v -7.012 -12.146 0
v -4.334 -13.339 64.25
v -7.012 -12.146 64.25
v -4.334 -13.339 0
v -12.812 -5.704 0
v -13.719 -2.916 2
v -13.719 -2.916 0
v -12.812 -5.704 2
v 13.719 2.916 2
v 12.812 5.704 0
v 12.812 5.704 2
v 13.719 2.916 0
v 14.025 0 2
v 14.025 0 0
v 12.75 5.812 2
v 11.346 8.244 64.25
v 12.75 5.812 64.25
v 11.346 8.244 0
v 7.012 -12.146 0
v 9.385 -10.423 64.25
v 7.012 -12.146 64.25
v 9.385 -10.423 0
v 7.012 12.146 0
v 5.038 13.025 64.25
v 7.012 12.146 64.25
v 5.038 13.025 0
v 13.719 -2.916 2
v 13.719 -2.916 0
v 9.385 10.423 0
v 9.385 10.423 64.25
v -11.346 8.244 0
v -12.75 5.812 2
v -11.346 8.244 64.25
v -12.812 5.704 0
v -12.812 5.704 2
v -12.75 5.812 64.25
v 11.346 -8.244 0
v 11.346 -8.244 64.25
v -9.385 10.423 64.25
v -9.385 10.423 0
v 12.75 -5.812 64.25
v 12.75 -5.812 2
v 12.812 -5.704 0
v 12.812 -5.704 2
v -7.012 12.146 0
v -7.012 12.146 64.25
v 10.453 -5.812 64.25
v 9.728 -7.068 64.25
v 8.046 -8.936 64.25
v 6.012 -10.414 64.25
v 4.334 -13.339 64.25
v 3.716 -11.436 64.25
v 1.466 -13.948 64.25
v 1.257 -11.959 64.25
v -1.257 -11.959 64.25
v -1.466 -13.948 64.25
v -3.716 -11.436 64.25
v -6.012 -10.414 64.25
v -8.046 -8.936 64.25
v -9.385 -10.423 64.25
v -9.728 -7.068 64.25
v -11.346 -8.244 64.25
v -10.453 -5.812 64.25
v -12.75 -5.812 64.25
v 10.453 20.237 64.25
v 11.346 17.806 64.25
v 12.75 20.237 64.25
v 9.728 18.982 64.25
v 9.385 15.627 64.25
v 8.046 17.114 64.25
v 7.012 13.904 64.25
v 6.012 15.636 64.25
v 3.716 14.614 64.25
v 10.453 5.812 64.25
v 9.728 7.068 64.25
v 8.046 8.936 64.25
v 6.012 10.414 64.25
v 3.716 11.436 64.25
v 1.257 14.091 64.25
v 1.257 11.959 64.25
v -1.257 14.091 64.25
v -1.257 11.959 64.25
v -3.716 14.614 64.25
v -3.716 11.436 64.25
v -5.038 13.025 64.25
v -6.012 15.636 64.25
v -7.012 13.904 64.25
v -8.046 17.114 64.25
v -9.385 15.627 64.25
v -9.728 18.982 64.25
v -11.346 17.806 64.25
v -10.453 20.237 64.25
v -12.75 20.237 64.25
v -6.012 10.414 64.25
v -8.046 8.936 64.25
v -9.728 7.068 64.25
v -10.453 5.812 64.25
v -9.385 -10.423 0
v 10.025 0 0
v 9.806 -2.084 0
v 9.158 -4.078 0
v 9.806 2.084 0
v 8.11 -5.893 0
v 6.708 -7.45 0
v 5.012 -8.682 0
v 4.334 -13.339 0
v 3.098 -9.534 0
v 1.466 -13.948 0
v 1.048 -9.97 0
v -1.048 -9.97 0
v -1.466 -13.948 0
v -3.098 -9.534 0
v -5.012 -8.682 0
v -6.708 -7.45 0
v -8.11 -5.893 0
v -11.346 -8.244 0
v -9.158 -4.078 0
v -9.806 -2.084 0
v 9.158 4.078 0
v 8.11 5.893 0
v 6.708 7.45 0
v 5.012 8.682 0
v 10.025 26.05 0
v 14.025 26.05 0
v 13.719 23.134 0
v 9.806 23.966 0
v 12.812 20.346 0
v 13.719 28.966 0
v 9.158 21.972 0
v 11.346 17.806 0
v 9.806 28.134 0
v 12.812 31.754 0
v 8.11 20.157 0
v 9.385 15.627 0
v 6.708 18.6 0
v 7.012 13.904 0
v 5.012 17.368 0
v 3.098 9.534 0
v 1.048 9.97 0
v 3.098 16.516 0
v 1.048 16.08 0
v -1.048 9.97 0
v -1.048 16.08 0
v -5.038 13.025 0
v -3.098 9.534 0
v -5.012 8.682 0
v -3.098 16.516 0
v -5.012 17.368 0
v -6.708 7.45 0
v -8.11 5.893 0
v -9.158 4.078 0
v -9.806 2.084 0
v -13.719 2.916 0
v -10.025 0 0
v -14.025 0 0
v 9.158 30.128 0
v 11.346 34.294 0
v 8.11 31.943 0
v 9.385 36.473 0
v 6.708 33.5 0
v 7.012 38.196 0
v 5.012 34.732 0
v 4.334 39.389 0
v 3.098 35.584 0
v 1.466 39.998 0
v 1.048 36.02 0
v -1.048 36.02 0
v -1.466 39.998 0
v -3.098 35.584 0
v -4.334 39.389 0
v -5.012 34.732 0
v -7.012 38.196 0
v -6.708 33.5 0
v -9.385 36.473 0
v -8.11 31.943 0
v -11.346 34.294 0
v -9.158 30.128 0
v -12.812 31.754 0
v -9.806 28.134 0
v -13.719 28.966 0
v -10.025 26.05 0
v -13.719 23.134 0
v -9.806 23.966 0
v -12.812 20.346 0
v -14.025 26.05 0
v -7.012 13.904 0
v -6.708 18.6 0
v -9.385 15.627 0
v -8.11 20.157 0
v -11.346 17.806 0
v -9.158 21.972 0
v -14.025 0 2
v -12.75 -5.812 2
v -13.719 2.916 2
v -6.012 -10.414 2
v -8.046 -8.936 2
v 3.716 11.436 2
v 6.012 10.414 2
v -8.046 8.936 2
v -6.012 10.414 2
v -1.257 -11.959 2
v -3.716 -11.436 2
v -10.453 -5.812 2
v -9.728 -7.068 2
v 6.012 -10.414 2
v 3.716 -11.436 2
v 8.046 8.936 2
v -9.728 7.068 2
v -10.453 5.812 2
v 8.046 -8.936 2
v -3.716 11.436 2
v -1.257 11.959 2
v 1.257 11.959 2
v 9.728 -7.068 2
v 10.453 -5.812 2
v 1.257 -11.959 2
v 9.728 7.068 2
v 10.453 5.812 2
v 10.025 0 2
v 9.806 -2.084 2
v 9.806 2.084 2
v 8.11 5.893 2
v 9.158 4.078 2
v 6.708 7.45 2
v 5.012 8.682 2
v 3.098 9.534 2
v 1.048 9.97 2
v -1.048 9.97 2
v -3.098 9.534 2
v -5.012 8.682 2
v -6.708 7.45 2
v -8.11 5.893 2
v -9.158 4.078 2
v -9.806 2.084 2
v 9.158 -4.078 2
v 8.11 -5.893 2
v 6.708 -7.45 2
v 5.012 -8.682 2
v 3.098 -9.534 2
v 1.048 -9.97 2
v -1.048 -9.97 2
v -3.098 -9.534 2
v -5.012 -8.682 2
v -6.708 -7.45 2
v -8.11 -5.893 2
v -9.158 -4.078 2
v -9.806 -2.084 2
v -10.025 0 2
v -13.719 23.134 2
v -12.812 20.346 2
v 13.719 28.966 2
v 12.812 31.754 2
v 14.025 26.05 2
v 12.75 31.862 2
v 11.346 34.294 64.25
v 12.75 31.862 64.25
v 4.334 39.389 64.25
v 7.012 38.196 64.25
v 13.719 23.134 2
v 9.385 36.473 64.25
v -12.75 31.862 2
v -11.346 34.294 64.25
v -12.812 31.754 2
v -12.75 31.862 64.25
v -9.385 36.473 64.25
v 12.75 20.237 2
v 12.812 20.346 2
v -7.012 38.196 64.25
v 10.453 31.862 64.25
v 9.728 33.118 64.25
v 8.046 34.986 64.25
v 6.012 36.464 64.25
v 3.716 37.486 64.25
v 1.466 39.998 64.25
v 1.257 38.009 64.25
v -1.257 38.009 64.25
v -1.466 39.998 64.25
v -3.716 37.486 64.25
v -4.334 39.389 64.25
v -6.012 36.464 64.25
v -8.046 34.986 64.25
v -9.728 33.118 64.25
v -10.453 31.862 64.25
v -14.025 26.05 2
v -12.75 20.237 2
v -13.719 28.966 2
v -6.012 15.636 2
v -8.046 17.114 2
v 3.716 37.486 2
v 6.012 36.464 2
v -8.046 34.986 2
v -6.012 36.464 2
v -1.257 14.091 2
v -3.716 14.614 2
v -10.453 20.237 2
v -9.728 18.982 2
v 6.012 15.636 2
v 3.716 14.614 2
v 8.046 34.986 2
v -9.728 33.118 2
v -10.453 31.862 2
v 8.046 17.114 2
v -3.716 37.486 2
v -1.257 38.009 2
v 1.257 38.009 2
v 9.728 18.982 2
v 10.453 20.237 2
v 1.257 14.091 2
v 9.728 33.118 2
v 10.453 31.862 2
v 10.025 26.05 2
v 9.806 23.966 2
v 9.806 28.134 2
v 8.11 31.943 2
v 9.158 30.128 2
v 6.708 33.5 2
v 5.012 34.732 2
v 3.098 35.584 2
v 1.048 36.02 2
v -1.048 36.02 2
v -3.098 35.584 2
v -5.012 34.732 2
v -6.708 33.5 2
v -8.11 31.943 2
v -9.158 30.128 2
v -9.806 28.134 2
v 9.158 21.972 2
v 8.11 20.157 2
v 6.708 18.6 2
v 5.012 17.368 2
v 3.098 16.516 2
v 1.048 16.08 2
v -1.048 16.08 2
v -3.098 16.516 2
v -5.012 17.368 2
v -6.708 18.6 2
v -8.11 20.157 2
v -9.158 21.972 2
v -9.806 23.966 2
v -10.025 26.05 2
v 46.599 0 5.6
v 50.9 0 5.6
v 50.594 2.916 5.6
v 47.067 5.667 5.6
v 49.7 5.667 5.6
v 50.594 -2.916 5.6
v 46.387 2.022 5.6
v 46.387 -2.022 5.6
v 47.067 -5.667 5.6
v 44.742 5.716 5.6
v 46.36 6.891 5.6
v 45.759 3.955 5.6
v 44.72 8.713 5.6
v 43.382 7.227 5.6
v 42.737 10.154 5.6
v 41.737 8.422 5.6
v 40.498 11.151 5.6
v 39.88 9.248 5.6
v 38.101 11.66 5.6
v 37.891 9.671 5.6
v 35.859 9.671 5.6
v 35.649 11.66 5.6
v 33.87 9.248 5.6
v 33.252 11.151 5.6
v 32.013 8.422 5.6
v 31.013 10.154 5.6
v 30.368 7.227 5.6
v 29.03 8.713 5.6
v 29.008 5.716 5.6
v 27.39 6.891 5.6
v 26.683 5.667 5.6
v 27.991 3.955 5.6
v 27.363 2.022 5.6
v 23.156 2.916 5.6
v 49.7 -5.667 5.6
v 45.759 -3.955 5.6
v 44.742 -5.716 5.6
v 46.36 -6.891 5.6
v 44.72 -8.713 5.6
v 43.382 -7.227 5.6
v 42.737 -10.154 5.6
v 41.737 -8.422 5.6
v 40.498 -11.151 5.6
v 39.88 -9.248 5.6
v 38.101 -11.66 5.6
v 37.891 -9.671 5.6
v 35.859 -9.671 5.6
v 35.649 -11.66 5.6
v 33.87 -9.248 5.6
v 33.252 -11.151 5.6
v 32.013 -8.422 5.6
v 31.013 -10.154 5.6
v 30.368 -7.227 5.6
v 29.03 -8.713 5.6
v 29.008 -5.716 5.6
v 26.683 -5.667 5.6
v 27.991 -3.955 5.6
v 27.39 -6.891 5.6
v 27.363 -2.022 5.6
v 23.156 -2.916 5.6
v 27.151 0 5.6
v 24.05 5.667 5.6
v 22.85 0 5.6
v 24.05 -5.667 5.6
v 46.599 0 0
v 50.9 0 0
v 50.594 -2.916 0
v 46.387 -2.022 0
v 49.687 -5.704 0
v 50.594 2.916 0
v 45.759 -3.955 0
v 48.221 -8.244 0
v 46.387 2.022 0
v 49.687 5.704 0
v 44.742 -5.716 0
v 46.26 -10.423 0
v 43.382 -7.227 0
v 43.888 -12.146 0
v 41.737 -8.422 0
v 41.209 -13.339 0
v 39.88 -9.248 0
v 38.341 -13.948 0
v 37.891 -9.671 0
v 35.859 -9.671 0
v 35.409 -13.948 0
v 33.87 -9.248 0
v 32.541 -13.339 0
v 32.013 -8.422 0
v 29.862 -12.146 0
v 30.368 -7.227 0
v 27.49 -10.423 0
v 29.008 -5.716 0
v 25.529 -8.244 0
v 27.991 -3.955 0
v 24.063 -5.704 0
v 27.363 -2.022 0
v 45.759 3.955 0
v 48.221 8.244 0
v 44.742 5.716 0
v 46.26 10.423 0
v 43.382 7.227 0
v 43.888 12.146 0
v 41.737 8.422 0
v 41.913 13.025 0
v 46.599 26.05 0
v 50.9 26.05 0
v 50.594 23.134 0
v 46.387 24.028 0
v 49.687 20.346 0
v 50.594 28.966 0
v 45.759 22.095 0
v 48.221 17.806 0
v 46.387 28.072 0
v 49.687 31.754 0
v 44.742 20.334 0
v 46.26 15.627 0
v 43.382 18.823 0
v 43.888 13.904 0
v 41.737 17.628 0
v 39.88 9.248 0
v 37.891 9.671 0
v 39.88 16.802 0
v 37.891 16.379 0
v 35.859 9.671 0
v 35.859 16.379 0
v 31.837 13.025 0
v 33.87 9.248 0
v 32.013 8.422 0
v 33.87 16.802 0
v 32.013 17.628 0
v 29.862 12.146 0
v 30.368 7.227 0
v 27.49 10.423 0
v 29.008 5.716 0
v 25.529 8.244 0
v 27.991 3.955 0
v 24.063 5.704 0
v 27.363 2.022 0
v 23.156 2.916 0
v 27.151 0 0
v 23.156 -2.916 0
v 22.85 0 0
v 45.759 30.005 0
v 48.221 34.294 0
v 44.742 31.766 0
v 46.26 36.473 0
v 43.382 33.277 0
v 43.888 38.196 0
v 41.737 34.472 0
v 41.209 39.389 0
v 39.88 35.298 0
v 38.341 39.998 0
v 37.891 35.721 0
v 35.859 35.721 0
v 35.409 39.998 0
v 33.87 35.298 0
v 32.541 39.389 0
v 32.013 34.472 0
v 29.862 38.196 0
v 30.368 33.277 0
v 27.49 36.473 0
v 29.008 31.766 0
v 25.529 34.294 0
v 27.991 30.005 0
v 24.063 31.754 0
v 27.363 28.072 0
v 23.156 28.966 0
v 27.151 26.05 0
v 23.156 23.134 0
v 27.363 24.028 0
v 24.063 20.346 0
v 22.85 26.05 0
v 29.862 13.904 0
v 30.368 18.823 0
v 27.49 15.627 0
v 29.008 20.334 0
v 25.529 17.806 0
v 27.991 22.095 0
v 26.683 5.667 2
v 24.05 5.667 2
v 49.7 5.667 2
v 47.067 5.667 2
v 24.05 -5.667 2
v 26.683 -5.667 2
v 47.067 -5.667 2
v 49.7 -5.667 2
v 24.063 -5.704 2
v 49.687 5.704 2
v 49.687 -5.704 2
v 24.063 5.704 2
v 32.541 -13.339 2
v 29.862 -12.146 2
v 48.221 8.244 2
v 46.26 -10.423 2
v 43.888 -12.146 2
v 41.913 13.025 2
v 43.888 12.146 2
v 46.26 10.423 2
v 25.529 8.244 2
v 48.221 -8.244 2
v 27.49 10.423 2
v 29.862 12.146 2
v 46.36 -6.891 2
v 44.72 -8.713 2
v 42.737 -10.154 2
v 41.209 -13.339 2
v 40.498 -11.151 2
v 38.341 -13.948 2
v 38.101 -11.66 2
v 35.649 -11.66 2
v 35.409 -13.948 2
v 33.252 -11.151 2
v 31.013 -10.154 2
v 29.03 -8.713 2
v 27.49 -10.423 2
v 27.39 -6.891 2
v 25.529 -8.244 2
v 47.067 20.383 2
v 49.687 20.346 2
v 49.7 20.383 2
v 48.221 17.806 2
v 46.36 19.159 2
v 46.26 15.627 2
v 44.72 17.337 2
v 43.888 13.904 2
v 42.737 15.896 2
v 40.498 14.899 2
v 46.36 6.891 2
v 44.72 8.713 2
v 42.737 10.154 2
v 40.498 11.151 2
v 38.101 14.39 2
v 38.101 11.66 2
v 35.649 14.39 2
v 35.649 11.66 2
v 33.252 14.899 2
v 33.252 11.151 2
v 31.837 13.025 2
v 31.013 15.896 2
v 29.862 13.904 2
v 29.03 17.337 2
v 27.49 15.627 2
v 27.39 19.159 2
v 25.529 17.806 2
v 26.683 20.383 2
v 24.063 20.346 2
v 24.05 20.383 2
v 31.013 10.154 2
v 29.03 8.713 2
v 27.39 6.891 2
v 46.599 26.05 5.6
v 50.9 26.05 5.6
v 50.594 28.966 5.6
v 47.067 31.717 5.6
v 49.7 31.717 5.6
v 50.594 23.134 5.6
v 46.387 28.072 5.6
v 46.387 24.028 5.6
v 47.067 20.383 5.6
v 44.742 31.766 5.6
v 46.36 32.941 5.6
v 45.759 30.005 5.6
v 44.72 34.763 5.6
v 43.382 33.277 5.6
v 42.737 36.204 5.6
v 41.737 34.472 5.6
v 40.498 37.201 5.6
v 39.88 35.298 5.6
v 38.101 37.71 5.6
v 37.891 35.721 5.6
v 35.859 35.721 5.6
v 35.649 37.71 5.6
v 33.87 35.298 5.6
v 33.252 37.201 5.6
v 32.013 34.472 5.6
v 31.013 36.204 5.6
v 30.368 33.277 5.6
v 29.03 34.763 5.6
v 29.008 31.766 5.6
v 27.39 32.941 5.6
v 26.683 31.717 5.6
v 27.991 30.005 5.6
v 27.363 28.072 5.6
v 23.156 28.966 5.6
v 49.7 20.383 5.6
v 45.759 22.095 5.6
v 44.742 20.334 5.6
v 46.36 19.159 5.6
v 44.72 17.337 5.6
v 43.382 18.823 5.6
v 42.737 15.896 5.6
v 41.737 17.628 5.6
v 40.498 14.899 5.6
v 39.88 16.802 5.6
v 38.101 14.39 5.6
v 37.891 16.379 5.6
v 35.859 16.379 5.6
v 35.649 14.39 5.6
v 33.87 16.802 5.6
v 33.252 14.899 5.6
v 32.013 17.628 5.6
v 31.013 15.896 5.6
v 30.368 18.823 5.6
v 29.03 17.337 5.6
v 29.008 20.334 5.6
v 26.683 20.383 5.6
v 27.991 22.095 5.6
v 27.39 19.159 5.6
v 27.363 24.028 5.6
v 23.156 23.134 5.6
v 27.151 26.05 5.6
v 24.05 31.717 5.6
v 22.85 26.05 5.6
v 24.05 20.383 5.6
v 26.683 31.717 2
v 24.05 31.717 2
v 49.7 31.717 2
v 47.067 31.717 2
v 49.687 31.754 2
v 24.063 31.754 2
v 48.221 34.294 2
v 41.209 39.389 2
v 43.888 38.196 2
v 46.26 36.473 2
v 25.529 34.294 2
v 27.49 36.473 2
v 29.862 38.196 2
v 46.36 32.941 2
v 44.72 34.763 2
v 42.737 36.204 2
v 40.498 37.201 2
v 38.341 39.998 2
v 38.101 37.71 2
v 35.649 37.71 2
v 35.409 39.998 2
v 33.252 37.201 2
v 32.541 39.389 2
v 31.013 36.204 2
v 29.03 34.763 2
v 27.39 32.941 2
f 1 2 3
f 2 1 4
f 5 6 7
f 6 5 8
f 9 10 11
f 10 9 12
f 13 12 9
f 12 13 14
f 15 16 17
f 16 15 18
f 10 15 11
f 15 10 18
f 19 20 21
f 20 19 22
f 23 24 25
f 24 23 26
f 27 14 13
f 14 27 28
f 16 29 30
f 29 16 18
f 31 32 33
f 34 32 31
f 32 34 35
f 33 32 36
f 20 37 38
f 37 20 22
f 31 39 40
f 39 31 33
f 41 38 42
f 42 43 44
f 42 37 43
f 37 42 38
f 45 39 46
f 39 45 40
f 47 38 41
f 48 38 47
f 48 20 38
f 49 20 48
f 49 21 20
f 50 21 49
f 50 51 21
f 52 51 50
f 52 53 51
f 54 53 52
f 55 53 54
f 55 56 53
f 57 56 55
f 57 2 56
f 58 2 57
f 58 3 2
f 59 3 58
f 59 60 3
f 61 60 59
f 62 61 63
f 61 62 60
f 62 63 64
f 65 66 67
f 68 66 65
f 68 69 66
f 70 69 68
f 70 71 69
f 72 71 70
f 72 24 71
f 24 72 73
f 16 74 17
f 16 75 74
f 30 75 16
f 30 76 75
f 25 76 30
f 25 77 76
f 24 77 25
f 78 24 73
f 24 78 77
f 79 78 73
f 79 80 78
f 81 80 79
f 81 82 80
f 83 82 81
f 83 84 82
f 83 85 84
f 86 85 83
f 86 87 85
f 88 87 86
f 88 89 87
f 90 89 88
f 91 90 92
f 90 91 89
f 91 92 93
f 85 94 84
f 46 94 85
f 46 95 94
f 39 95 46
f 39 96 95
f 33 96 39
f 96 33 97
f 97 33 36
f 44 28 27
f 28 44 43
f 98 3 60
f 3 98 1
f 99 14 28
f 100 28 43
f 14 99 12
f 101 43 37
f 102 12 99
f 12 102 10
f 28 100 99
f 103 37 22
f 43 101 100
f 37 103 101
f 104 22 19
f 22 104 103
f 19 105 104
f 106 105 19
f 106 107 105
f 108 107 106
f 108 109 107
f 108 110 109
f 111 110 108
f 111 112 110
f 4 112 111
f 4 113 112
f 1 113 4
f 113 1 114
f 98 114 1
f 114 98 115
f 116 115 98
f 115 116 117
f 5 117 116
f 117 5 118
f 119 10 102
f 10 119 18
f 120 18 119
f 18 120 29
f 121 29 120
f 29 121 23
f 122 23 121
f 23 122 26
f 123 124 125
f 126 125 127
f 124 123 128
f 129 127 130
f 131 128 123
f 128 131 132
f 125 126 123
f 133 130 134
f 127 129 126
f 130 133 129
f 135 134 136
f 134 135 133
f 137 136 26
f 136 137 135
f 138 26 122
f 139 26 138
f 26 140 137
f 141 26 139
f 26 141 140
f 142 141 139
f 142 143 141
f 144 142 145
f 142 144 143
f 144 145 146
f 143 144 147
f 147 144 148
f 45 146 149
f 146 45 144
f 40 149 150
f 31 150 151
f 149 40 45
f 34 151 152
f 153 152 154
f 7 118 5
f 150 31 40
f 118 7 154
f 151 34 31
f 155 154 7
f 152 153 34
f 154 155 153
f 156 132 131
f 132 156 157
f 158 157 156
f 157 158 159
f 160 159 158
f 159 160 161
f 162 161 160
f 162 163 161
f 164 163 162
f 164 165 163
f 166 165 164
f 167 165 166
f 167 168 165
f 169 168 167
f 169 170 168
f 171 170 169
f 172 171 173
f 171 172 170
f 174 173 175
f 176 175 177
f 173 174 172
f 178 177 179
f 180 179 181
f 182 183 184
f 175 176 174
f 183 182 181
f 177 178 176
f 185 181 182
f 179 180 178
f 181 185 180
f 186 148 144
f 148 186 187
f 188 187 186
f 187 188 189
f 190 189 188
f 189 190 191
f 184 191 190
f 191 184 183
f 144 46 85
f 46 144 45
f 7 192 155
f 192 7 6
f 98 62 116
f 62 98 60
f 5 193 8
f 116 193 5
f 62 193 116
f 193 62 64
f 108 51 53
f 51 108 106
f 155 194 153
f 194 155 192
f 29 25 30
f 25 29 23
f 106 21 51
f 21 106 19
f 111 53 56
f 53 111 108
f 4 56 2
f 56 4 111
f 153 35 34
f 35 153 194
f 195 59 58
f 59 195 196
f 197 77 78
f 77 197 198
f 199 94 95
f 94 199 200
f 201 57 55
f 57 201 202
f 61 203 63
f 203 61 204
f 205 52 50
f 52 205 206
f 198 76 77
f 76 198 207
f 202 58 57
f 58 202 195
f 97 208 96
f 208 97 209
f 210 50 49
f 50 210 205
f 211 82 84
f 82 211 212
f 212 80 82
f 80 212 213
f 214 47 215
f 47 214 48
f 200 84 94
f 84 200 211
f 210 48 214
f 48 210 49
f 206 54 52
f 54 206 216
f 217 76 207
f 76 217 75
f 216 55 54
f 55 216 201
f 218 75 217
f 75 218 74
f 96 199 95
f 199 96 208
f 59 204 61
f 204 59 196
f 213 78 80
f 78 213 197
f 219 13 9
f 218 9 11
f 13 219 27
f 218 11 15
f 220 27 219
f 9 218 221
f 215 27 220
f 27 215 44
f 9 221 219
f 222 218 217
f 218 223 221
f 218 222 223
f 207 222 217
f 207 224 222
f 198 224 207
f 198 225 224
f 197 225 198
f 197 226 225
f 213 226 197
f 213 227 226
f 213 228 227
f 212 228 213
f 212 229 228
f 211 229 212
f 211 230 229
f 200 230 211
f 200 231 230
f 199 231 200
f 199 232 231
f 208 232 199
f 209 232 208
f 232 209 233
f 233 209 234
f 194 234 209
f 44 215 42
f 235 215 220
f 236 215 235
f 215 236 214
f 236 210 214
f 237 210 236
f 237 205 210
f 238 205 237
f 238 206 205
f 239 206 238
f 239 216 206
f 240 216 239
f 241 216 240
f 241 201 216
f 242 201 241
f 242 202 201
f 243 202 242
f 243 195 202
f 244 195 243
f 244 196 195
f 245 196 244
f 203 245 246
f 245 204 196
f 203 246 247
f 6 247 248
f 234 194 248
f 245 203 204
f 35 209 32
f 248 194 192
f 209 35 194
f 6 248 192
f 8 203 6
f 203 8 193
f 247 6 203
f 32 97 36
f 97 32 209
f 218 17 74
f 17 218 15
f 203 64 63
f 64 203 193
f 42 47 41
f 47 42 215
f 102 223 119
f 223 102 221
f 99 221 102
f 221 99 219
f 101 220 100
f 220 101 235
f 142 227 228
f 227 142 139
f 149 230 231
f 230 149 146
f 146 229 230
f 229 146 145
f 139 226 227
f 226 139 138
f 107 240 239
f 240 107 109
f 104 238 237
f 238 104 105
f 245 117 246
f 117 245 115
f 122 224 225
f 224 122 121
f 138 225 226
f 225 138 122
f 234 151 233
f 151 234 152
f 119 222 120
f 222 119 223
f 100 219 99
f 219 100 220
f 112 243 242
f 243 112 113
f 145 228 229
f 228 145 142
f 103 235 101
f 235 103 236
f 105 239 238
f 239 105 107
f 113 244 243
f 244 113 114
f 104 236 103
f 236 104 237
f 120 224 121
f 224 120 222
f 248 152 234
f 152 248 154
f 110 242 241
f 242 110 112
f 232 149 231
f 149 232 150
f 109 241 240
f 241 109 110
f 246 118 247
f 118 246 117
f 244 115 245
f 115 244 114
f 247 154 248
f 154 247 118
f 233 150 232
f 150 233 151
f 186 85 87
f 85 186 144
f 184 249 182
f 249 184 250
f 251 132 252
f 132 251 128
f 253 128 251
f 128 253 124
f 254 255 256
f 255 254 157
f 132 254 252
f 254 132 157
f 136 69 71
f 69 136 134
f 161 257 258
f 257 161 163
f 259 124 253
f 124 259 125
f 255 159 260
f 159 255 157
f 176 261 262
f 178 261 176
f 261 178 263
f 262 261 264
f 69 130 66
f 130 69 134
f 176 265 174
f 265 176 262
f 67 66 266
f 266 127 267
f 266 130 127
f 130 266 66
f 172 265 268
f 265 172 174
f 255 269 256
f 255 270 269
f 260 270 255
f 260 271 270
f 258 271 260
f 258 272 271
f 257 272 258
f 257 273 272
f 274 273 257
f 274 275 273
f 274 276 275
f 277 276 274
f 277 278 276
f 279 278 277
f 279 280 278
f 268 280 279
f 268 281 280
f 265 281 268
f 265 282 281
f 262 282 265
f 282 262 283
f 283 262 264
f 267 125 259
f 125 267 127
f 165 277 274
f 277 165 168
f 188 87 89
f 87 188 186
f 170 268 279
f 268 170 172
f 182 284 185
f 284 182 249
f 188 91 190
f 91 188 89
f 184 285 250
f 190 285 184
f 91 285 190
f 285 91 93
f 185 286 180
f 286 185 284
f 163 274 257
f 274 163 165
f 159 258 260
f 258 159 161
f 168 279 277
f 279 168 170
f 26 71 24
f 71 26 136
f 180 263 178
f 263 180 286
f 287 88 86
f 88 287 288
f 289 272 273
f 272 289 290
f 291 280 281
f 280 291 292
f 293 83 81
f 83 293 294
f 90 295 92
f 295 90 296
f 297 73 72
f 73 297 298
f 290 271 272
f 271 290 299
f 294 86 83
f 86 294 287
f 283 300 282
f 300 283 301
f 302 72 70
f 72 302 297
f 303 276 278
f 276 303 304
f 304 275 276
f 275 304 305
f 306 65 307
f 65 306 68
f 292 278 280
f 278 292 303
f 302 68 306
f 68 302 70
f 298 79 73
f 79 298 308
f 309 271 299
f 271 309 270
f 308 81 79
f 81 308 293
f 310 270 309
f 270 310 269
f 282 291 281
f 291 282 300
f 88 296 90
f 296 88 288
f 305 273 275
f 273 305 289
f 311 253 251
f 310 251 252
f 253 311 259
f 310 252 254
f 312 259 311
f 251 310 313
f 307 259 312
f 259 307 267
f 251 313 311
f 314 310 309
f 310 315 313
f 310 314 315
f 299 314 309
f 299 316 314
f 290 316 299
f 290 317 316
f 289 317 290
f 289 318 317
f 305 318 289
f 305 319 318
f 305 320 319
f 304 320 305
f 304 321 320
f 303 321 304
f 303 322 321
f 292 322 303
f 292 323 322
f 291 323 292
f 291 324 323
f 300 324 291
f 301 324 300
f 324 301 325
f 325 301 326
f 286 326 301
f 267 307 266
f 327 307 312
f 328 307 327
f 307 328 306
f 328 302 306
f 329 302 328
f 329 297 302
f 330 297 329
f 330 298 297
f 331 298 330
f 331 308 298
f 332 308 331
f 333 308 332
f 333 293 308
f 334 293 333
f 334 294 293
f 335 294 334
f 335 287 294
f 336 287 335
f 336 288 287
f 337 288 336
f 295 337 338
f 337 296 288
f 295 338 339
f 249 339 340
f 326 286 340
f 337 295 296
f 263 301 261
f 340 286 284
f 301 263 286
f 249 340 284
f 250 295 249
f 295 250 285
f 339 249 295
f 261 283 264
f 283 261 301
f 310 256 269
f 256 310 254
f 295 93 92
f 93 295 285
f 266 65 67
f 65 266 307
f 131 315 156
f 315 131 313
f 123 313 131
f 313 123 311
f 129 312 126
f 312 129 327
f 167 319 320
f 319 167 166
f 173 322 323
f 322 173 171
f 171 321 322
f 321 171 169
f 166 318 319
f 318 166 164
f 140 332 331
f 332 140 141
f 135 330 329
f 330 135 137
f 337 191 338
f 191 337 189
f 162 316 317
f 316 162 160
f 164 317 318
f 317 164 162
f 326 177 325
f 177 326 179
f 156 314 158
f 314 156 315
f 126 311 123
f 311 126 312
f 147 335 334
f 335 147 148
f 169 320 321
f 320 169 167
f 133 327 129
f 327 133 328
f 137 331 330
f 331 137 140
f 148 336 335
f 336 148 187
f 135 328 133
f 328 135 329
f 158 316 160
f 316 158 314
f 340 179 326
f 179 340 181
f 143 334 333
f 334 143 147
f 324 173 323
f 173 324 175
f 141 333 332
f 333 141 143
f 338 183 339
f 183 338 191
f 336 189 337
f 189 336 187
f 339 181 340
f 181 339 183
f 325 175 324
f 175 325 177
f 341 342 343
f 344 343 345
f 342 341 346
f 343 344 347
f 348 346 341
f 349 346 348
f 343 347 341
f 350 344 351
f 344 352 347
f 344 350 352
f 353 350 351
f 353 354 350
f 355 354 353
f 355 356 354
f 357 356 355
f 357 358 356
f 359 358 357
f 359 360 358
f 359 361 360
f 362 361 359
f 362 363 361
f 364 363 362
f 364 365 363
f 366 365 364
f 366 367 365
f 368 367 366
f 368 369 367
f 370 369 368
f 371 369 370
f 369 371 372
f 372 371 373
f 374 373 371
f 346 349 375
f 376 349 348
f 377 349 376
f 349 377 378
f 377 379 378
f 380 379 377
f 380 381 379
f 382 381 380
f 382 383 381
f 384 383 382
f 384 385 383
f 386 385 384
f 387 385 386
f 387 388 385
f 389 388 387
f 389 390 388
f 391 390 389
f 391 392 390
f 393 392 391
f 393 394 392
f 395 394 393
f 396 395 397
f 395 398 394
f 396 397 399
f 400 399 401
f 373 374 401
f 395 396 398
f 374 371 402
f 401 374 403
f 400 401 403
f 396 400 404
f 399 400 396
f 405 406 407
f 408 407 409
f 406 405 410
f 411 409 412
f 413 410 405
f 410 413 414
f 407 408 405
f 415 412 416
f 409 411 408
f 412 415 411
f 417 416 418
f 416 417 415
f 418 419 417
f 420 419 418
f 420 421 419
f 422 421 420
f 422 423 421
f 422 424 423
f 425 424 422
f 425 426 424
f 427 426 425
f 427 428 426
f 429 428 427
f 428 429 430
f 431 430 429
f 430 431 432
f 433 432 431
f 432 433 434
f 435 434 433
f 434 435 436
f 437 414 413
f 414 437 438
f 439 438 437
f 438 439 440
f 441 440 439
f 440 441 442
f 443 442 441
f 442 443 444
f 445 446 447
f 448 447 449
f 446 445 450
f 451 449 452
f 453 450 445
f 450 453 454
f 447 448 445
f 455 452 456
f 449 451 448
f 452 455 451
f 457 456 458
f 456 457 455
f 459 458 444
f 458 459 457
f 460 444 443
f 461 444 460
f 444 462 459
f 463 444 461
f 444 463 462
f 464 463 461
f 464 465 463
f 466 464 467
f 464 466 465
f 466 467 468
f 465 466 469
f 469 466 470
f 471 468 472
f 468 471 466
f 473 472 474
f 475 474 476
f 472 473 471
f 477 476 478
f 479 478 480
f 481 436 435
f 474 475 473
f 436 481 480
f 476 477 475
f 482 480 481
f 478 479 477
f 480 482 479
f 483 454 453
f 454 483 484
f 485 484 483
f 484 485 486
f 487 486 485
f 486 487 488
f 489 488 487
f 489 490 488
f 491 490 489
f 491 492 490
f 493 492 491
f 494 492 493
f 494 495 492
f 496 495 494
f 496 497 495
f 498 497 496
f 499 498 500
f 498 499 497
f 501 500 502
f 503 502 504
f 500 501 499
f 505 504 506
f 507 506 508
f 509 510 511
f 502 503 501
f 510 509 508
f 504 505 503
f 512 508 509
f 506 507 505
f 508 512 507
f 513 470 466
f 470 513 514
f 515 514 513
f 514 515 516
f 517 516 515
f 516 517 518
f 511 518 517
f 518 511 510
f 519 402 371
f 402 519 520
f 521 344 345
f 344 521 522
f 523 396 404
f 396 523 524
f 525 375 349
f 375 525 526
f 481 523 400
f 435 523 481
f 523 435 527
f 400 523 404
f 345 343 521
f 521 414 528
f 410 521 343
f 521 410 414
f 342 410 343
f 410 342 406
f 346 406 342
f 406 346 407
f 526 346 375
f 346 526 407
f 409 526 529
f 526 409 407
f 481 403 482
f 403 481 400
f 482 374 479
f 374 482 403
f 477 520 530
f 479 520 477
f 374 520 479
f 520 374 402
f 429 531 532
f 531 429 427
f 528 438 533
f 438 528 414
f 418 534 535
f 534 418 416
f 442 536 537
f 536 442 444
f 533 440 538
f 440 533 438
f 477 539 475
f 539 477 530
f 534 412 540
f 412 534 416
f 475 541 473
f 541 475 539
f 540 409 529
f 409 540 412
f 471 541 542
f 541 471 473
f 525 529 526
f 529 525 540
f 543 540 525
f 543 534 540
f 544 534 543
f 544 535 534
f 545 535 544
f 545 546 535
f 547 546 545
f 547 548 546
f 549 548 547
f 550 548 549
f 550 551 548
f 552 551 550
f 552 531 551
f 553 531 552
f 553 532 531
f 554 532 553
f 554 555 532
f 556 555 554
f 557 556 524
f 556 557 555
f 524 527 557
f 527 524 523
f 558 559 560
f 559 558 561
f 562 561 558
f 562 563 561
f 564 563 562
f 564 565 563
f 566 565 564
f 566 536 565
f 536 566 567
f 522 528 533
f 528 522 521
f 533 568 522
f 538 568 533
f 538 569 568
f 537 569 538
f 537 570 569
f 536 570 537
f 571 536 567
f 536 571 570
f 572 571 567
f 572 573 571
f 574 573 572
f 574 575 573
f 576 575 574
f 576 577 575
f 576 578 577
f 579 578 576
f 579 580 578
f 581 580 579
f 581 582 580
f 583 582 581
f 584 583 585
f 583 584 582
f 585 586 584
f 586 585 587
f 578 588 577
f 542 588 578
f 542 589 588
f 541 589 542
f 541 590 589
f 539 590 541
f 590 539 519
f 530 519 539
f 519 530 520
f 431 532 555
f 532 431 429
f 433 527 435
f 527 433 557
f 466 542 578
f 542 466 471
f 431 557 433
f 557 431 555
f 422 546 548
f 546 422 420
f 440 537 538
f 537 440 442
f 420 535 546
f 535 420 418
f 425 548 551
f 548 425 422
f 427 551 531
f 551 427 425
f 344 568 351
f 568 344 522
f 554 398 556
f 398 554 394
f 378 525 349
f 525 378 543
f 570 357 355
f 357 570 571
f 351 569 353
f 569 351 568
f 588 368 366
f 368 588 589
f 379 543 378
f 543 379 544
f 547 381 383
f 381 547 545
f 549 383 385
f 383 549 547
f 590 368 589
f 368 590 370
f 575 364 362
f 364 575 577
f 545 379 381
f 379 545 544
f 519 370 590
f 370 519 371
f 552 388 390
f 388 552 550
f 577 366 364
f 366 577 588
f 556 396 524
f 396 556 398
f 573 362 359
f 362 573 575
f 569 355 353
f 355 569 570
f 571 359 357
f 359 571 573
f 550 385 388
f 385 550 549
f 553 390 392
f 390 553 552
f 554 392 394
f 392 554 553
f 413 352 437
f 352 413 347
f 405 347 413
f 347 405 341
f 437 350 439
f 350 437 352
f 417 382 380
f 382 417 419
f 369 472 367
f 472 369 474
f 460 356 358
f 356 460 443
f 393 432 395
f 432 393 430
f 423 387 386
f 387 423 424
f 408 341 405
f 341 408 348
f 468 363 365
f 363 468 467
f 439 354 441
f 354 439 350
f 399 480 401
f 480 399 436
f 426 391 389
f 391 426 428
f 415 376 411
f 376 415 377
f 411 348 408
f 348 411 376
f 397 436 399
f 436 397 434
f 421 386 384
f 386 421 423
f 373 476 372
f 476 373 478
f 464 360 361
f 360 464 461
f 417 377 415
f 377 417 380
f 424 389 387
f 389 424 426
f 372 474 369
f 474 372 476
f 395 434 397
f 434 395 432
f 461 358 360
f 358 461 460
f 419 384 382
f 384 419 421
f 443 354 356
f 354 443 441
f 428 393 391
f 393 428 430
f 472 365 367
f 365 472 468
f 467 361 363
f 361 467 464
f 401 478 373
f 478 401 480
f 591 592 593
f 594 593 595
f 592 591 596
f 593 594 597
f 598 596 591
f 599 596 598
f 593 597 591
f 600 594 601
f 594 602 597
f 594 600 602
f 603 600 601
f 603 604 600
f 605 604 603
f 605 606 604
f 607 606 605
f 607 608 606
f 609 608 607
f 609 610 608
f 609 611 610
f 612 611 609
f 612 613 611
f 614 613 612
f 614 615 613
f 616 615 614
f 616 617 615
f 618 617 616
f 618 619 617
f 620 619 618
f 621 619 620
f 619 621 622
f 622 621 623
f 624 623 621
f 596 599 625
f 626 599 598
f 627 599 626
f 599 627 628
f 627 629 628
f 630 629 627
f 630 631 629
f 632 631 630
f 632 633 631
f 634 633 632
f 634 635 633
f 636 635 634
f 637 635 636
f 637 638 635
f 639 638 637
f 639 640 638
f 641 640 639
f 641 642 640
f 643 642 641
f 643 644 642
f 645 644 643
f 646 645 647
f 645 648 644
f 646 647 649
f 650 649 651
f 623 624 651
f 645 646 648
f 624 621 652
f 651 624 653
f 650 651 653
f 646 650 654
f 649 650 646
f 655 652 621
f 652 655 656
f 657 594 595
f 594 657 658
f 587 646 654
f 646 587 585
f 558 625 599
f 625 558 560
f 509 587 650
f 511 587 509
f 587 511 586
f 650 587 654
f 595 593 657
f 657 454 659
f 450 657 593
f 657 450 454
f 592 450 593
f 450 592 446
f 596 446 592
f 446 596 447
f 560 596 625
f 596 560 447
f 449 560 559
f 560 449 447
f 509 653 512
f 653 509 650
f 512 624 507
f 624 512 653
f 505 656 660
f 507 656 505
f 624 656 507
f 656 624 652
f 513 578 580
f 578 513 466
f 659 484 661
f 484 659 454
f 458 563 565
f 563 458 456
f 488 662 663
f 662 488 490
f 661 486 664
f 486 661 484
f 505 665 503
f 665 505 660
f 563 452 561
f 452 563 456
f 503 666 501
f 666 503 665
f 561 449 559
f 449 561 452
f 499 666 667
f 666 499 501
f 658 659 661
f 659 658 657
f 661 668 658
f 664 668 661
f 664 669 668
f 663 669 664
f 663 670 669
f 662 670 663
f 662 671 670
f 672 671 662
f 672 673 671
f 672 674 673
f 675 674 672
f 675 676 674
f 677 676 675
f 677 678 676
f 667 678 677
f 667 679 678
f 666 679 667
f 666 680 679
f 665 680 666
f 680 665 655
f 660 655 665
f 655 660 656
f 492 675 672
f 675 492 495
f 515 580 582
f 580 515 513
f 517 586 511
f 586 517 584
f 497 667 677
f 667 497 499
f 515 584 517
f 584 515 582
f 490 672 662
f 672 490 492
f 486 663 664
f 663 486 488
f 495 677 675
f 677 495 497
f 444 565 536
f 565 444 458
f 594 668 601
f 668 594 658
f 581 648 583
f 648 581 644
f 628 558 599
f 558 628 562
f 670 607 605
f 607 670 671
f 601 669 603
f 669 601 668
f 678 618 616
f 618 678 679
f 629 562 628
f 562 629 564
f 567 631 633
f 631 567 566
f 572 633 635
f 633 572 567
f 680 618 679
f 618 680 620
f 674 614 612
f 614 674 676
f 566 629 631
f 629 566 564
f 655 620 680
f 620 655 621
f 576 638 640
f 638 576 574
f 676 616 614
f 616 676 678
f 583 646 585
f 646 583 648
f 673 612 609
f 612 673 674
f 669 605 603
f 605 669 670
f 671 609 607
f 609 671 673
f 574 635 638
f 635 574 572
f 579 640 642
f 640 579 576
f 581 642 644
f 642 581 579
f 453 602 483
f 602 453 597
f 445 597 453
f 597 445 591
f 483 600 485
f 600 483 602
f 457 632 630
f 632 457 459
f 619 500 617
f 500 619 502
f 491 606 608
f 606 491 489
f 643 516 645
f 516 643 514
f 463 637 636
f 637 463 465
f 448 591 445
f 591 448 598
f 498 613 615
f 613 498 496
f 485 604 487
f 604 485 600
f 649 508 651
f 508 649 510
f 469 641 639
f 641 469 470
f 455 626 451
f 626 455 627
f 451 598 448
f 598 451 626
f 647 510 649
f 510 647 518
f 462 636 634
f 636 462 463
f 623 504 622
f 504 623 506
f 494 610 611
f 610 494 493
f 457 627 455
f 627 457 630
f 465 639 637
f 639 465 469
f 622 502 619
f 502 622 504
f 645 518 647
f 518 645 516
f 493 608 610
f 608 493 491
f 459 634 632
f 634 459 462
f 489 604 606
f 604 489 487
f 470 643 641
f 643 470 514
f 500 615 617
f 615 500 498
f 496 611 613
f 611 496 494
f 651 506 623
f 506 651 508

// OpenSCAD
/*
 * PARAMETRIC COIN TUBES + CAP
 * VERSION 1.3.2
 * last update: 30/12/16
 * design by newq
 * mod kitwallace, falex (thanks!)
 */

// 
// the generated tubes insides are 2 coins higher than the number of coins they fit

coin_type = 0; // [ 0:1 Euro, 1:2 Euro, 2:50 Euro cents,  3:20 Euro cents, 4:10 Euro cents, 5:5 Euro cents, 6:2 Euro cent, 7: 1 Euro cent, 8: 1 US Dollar, 9: 0.50 US Dollar, 10: 0.25 US Dollar, 11: 0.10 US Dollar, 12: 0.05 US Dollar, 13: 0.01 US Dollar, 14: 2 Canadian Dollar, 15: 1 Canadian Dollar, 16: 0.50 Canadian Dollar, 17: 0.25 Canadian Dollar, 18: 0.10 Canadian Dollar, 19: 0.05 Canadian Dollar, 20: 0.01 Canadian Dollar, 21: 5 Swiss Francs, 22:2 Swiss Francs, 23:1 Swiss Francs, 24:0.5 Swiss Francs, 25: 0.20 Swiss Francs, 26:0.10 Swiss Francs, 27:0.05 Swiss Francs]

// how many stacked coins should fit in a tube
number_of_coins = 25; 
number_of_tubes = 2; 

// Do you want to print the tubes?
generate_tube = 1; // [1:Yes, 0:No]
// Do you want a cap to close the tube?
generate_cap = 1; // [1:Yes, 0:No]
// thickness of wall and bottom (mm)
tube_wall = 2;  
// clearance from coin to wall of tube (mm)
clearance = 0.4;
// if the cap fits too tight you might decrease slightly
fudge_factor = 0.975; 

// NOTHING TO SEE HERE :)

// coin data - name, diameter, height
coins = [ 
              ["1 Euro", 23.25, 2.33], 
              ["2 Euro", 25.75, 2.20],
              ["50 Euro cents", 24.25, 2.38],
              ["20 Euro cents", 22.25, 2.14],
              ["10 Euro cents", 19.75, 1.93],
              ["5 Euro cents", 21.25, 1.67],
              ["2 Euro cents", 18.75, 1.67],
              ["1 Euro cents", 16.25, 1.67],
              ["1 US Dollar", 26.50, 2.00],
              ["0.50 US Dollar", 30.61, 2.15],
              ["0.25 US Dollar", 24.26, 1.75],
              ["0.10 US Dollar", 17.91, 1.35],
              ["0.05 US Dollar", 21.21, 1.95],
              ["0.01 US Dollar", 19.05, 1.55],
              ["2 Canadian Dollar", 28.00, 1.80],
              ["1 Canadian Dollar", 26.50, 1.75],
              ["0.50 Canadian Dollar", 27.13, 1.95],
              ["0.25 Canadian Dollar", 23.88, 1.58],
              ["0.10 Canadian Dollar", 18.03, 1.22],
              ["0.05 Canadian Dollar", 21.2, 1.76],
              ["0.01 Canadian Dollar", 19.05, 1.45],
              ["5 Swiss Francs", 31.45, 2.35],
              ["2 Swiss Francs", 27.40, 2.15],
              ["1 Swiss Francs", 23.20, 1.55],
              ["0.50 Swiss Francs", 18.20, 1.25],
              ["0.20 Swiss Francs", 21.05, 1.65],
              ["0.10 Swiss Francs", 19.15, 1.45],
              ["0.05 Swiss Francs", 17.15, 1.25]
            ];

coin_diameter = coins[coin_type][1];
coin_height = coins[coin_type][2];

// generating the tubes
if (generate_tube) {
  assign(cyl_inner_h = (coin_height * number_of_coins) + (4 * tube_wall),
             cyl_inner_r = (coin_diameter / 2) + clearance,

             cyl_outer_h = (coin_height * number_of_coins) + (3 * tube_wall),
             cyl_outer_r = (coin_diameter / 2) + tube_wall + clearance,

             cutout_x = coin_diameter + (4 * tube_wall),
             cutout_y = (coin_diameter / 2),
             cutout_z = (coin_height * number_of_coins) + (3 * tube_wall)
             )


  for (z = [0 : (number_of_tubes-1)]){

	translate (v = [0, z * (cyl_outer_r * 2 - tube_wall), 0]){
		difference(){	
			difference(){
				difference() {
					// outer tube
					cylinder(h = cyl_outer_h, r = cyl_outer_r);
					// inner tube
					translate(v = [0, 0, tube_wall]) {
						cylinder(h = cyl_inner_h, r = cyl_inner_r);
					}
				}
				// round bottom cutout
				translate (v = [0, 0, ((cutout_z / 2) + tube_wall)]){
					cube(size = [cutout_x, cutout_y, cutout_z], center = true);
				}
			}
			// cutout
			translate (v = [0, 0, -tube_wall]){
				cylinder(h = (cyl_inner_h + tube_wall), r = (cyl_inner_r - tube_wall));
			}
		}
   }
}

}

// generating the tube tops

if (generate_cap) {
   assign (cyl_inner_h = 3*tube_wall - clearance,
               cyl_inner_r = ((coin_diameter / 2) + clearance) * fudge_factor,

               cyl_outer_h = tube_wall,
               cyl_outer_r = (coin_diameter / 2) + tube_wall + clearance,

               cutout_x = coin_diameter + (4 * tube_wall),
               cutout_y = (coin_diameter / 2) * fudge_factor,
               cutout_z = 3*tube_wall - clearance
             )
    translate([1.5 * coin_diameter + tube_wall, 0, 0]){
	for (z = [0 : (number_of_tubes-1)]){
		
		translate (v = [0, z * (cyl_outer_r * 2 - tube_wall), 0]){
			difference(){
				union(){		
					cylinder(h = cyl_outer_h, r = cyl_outer_r);
					cylinder(h = cyl_inner_h, r = cyl_inner_r);
				
					intersection(){
						translate([0,0,cutout_z/2]){
							cube(size = [cutout_x, cutout_y, cutout_z], center = true);
						}
						cylinder(h = cyl_outer_h+10, r = cyl_outer_r);
					}
				}
				
				translate([0,0,-(cyl_inner_h /2)]){
					cylinder(h = cyl_inner_h *2, r = cyl_inner_r - tube_wall);
				}			
			}		
		}
	}	
}
}
